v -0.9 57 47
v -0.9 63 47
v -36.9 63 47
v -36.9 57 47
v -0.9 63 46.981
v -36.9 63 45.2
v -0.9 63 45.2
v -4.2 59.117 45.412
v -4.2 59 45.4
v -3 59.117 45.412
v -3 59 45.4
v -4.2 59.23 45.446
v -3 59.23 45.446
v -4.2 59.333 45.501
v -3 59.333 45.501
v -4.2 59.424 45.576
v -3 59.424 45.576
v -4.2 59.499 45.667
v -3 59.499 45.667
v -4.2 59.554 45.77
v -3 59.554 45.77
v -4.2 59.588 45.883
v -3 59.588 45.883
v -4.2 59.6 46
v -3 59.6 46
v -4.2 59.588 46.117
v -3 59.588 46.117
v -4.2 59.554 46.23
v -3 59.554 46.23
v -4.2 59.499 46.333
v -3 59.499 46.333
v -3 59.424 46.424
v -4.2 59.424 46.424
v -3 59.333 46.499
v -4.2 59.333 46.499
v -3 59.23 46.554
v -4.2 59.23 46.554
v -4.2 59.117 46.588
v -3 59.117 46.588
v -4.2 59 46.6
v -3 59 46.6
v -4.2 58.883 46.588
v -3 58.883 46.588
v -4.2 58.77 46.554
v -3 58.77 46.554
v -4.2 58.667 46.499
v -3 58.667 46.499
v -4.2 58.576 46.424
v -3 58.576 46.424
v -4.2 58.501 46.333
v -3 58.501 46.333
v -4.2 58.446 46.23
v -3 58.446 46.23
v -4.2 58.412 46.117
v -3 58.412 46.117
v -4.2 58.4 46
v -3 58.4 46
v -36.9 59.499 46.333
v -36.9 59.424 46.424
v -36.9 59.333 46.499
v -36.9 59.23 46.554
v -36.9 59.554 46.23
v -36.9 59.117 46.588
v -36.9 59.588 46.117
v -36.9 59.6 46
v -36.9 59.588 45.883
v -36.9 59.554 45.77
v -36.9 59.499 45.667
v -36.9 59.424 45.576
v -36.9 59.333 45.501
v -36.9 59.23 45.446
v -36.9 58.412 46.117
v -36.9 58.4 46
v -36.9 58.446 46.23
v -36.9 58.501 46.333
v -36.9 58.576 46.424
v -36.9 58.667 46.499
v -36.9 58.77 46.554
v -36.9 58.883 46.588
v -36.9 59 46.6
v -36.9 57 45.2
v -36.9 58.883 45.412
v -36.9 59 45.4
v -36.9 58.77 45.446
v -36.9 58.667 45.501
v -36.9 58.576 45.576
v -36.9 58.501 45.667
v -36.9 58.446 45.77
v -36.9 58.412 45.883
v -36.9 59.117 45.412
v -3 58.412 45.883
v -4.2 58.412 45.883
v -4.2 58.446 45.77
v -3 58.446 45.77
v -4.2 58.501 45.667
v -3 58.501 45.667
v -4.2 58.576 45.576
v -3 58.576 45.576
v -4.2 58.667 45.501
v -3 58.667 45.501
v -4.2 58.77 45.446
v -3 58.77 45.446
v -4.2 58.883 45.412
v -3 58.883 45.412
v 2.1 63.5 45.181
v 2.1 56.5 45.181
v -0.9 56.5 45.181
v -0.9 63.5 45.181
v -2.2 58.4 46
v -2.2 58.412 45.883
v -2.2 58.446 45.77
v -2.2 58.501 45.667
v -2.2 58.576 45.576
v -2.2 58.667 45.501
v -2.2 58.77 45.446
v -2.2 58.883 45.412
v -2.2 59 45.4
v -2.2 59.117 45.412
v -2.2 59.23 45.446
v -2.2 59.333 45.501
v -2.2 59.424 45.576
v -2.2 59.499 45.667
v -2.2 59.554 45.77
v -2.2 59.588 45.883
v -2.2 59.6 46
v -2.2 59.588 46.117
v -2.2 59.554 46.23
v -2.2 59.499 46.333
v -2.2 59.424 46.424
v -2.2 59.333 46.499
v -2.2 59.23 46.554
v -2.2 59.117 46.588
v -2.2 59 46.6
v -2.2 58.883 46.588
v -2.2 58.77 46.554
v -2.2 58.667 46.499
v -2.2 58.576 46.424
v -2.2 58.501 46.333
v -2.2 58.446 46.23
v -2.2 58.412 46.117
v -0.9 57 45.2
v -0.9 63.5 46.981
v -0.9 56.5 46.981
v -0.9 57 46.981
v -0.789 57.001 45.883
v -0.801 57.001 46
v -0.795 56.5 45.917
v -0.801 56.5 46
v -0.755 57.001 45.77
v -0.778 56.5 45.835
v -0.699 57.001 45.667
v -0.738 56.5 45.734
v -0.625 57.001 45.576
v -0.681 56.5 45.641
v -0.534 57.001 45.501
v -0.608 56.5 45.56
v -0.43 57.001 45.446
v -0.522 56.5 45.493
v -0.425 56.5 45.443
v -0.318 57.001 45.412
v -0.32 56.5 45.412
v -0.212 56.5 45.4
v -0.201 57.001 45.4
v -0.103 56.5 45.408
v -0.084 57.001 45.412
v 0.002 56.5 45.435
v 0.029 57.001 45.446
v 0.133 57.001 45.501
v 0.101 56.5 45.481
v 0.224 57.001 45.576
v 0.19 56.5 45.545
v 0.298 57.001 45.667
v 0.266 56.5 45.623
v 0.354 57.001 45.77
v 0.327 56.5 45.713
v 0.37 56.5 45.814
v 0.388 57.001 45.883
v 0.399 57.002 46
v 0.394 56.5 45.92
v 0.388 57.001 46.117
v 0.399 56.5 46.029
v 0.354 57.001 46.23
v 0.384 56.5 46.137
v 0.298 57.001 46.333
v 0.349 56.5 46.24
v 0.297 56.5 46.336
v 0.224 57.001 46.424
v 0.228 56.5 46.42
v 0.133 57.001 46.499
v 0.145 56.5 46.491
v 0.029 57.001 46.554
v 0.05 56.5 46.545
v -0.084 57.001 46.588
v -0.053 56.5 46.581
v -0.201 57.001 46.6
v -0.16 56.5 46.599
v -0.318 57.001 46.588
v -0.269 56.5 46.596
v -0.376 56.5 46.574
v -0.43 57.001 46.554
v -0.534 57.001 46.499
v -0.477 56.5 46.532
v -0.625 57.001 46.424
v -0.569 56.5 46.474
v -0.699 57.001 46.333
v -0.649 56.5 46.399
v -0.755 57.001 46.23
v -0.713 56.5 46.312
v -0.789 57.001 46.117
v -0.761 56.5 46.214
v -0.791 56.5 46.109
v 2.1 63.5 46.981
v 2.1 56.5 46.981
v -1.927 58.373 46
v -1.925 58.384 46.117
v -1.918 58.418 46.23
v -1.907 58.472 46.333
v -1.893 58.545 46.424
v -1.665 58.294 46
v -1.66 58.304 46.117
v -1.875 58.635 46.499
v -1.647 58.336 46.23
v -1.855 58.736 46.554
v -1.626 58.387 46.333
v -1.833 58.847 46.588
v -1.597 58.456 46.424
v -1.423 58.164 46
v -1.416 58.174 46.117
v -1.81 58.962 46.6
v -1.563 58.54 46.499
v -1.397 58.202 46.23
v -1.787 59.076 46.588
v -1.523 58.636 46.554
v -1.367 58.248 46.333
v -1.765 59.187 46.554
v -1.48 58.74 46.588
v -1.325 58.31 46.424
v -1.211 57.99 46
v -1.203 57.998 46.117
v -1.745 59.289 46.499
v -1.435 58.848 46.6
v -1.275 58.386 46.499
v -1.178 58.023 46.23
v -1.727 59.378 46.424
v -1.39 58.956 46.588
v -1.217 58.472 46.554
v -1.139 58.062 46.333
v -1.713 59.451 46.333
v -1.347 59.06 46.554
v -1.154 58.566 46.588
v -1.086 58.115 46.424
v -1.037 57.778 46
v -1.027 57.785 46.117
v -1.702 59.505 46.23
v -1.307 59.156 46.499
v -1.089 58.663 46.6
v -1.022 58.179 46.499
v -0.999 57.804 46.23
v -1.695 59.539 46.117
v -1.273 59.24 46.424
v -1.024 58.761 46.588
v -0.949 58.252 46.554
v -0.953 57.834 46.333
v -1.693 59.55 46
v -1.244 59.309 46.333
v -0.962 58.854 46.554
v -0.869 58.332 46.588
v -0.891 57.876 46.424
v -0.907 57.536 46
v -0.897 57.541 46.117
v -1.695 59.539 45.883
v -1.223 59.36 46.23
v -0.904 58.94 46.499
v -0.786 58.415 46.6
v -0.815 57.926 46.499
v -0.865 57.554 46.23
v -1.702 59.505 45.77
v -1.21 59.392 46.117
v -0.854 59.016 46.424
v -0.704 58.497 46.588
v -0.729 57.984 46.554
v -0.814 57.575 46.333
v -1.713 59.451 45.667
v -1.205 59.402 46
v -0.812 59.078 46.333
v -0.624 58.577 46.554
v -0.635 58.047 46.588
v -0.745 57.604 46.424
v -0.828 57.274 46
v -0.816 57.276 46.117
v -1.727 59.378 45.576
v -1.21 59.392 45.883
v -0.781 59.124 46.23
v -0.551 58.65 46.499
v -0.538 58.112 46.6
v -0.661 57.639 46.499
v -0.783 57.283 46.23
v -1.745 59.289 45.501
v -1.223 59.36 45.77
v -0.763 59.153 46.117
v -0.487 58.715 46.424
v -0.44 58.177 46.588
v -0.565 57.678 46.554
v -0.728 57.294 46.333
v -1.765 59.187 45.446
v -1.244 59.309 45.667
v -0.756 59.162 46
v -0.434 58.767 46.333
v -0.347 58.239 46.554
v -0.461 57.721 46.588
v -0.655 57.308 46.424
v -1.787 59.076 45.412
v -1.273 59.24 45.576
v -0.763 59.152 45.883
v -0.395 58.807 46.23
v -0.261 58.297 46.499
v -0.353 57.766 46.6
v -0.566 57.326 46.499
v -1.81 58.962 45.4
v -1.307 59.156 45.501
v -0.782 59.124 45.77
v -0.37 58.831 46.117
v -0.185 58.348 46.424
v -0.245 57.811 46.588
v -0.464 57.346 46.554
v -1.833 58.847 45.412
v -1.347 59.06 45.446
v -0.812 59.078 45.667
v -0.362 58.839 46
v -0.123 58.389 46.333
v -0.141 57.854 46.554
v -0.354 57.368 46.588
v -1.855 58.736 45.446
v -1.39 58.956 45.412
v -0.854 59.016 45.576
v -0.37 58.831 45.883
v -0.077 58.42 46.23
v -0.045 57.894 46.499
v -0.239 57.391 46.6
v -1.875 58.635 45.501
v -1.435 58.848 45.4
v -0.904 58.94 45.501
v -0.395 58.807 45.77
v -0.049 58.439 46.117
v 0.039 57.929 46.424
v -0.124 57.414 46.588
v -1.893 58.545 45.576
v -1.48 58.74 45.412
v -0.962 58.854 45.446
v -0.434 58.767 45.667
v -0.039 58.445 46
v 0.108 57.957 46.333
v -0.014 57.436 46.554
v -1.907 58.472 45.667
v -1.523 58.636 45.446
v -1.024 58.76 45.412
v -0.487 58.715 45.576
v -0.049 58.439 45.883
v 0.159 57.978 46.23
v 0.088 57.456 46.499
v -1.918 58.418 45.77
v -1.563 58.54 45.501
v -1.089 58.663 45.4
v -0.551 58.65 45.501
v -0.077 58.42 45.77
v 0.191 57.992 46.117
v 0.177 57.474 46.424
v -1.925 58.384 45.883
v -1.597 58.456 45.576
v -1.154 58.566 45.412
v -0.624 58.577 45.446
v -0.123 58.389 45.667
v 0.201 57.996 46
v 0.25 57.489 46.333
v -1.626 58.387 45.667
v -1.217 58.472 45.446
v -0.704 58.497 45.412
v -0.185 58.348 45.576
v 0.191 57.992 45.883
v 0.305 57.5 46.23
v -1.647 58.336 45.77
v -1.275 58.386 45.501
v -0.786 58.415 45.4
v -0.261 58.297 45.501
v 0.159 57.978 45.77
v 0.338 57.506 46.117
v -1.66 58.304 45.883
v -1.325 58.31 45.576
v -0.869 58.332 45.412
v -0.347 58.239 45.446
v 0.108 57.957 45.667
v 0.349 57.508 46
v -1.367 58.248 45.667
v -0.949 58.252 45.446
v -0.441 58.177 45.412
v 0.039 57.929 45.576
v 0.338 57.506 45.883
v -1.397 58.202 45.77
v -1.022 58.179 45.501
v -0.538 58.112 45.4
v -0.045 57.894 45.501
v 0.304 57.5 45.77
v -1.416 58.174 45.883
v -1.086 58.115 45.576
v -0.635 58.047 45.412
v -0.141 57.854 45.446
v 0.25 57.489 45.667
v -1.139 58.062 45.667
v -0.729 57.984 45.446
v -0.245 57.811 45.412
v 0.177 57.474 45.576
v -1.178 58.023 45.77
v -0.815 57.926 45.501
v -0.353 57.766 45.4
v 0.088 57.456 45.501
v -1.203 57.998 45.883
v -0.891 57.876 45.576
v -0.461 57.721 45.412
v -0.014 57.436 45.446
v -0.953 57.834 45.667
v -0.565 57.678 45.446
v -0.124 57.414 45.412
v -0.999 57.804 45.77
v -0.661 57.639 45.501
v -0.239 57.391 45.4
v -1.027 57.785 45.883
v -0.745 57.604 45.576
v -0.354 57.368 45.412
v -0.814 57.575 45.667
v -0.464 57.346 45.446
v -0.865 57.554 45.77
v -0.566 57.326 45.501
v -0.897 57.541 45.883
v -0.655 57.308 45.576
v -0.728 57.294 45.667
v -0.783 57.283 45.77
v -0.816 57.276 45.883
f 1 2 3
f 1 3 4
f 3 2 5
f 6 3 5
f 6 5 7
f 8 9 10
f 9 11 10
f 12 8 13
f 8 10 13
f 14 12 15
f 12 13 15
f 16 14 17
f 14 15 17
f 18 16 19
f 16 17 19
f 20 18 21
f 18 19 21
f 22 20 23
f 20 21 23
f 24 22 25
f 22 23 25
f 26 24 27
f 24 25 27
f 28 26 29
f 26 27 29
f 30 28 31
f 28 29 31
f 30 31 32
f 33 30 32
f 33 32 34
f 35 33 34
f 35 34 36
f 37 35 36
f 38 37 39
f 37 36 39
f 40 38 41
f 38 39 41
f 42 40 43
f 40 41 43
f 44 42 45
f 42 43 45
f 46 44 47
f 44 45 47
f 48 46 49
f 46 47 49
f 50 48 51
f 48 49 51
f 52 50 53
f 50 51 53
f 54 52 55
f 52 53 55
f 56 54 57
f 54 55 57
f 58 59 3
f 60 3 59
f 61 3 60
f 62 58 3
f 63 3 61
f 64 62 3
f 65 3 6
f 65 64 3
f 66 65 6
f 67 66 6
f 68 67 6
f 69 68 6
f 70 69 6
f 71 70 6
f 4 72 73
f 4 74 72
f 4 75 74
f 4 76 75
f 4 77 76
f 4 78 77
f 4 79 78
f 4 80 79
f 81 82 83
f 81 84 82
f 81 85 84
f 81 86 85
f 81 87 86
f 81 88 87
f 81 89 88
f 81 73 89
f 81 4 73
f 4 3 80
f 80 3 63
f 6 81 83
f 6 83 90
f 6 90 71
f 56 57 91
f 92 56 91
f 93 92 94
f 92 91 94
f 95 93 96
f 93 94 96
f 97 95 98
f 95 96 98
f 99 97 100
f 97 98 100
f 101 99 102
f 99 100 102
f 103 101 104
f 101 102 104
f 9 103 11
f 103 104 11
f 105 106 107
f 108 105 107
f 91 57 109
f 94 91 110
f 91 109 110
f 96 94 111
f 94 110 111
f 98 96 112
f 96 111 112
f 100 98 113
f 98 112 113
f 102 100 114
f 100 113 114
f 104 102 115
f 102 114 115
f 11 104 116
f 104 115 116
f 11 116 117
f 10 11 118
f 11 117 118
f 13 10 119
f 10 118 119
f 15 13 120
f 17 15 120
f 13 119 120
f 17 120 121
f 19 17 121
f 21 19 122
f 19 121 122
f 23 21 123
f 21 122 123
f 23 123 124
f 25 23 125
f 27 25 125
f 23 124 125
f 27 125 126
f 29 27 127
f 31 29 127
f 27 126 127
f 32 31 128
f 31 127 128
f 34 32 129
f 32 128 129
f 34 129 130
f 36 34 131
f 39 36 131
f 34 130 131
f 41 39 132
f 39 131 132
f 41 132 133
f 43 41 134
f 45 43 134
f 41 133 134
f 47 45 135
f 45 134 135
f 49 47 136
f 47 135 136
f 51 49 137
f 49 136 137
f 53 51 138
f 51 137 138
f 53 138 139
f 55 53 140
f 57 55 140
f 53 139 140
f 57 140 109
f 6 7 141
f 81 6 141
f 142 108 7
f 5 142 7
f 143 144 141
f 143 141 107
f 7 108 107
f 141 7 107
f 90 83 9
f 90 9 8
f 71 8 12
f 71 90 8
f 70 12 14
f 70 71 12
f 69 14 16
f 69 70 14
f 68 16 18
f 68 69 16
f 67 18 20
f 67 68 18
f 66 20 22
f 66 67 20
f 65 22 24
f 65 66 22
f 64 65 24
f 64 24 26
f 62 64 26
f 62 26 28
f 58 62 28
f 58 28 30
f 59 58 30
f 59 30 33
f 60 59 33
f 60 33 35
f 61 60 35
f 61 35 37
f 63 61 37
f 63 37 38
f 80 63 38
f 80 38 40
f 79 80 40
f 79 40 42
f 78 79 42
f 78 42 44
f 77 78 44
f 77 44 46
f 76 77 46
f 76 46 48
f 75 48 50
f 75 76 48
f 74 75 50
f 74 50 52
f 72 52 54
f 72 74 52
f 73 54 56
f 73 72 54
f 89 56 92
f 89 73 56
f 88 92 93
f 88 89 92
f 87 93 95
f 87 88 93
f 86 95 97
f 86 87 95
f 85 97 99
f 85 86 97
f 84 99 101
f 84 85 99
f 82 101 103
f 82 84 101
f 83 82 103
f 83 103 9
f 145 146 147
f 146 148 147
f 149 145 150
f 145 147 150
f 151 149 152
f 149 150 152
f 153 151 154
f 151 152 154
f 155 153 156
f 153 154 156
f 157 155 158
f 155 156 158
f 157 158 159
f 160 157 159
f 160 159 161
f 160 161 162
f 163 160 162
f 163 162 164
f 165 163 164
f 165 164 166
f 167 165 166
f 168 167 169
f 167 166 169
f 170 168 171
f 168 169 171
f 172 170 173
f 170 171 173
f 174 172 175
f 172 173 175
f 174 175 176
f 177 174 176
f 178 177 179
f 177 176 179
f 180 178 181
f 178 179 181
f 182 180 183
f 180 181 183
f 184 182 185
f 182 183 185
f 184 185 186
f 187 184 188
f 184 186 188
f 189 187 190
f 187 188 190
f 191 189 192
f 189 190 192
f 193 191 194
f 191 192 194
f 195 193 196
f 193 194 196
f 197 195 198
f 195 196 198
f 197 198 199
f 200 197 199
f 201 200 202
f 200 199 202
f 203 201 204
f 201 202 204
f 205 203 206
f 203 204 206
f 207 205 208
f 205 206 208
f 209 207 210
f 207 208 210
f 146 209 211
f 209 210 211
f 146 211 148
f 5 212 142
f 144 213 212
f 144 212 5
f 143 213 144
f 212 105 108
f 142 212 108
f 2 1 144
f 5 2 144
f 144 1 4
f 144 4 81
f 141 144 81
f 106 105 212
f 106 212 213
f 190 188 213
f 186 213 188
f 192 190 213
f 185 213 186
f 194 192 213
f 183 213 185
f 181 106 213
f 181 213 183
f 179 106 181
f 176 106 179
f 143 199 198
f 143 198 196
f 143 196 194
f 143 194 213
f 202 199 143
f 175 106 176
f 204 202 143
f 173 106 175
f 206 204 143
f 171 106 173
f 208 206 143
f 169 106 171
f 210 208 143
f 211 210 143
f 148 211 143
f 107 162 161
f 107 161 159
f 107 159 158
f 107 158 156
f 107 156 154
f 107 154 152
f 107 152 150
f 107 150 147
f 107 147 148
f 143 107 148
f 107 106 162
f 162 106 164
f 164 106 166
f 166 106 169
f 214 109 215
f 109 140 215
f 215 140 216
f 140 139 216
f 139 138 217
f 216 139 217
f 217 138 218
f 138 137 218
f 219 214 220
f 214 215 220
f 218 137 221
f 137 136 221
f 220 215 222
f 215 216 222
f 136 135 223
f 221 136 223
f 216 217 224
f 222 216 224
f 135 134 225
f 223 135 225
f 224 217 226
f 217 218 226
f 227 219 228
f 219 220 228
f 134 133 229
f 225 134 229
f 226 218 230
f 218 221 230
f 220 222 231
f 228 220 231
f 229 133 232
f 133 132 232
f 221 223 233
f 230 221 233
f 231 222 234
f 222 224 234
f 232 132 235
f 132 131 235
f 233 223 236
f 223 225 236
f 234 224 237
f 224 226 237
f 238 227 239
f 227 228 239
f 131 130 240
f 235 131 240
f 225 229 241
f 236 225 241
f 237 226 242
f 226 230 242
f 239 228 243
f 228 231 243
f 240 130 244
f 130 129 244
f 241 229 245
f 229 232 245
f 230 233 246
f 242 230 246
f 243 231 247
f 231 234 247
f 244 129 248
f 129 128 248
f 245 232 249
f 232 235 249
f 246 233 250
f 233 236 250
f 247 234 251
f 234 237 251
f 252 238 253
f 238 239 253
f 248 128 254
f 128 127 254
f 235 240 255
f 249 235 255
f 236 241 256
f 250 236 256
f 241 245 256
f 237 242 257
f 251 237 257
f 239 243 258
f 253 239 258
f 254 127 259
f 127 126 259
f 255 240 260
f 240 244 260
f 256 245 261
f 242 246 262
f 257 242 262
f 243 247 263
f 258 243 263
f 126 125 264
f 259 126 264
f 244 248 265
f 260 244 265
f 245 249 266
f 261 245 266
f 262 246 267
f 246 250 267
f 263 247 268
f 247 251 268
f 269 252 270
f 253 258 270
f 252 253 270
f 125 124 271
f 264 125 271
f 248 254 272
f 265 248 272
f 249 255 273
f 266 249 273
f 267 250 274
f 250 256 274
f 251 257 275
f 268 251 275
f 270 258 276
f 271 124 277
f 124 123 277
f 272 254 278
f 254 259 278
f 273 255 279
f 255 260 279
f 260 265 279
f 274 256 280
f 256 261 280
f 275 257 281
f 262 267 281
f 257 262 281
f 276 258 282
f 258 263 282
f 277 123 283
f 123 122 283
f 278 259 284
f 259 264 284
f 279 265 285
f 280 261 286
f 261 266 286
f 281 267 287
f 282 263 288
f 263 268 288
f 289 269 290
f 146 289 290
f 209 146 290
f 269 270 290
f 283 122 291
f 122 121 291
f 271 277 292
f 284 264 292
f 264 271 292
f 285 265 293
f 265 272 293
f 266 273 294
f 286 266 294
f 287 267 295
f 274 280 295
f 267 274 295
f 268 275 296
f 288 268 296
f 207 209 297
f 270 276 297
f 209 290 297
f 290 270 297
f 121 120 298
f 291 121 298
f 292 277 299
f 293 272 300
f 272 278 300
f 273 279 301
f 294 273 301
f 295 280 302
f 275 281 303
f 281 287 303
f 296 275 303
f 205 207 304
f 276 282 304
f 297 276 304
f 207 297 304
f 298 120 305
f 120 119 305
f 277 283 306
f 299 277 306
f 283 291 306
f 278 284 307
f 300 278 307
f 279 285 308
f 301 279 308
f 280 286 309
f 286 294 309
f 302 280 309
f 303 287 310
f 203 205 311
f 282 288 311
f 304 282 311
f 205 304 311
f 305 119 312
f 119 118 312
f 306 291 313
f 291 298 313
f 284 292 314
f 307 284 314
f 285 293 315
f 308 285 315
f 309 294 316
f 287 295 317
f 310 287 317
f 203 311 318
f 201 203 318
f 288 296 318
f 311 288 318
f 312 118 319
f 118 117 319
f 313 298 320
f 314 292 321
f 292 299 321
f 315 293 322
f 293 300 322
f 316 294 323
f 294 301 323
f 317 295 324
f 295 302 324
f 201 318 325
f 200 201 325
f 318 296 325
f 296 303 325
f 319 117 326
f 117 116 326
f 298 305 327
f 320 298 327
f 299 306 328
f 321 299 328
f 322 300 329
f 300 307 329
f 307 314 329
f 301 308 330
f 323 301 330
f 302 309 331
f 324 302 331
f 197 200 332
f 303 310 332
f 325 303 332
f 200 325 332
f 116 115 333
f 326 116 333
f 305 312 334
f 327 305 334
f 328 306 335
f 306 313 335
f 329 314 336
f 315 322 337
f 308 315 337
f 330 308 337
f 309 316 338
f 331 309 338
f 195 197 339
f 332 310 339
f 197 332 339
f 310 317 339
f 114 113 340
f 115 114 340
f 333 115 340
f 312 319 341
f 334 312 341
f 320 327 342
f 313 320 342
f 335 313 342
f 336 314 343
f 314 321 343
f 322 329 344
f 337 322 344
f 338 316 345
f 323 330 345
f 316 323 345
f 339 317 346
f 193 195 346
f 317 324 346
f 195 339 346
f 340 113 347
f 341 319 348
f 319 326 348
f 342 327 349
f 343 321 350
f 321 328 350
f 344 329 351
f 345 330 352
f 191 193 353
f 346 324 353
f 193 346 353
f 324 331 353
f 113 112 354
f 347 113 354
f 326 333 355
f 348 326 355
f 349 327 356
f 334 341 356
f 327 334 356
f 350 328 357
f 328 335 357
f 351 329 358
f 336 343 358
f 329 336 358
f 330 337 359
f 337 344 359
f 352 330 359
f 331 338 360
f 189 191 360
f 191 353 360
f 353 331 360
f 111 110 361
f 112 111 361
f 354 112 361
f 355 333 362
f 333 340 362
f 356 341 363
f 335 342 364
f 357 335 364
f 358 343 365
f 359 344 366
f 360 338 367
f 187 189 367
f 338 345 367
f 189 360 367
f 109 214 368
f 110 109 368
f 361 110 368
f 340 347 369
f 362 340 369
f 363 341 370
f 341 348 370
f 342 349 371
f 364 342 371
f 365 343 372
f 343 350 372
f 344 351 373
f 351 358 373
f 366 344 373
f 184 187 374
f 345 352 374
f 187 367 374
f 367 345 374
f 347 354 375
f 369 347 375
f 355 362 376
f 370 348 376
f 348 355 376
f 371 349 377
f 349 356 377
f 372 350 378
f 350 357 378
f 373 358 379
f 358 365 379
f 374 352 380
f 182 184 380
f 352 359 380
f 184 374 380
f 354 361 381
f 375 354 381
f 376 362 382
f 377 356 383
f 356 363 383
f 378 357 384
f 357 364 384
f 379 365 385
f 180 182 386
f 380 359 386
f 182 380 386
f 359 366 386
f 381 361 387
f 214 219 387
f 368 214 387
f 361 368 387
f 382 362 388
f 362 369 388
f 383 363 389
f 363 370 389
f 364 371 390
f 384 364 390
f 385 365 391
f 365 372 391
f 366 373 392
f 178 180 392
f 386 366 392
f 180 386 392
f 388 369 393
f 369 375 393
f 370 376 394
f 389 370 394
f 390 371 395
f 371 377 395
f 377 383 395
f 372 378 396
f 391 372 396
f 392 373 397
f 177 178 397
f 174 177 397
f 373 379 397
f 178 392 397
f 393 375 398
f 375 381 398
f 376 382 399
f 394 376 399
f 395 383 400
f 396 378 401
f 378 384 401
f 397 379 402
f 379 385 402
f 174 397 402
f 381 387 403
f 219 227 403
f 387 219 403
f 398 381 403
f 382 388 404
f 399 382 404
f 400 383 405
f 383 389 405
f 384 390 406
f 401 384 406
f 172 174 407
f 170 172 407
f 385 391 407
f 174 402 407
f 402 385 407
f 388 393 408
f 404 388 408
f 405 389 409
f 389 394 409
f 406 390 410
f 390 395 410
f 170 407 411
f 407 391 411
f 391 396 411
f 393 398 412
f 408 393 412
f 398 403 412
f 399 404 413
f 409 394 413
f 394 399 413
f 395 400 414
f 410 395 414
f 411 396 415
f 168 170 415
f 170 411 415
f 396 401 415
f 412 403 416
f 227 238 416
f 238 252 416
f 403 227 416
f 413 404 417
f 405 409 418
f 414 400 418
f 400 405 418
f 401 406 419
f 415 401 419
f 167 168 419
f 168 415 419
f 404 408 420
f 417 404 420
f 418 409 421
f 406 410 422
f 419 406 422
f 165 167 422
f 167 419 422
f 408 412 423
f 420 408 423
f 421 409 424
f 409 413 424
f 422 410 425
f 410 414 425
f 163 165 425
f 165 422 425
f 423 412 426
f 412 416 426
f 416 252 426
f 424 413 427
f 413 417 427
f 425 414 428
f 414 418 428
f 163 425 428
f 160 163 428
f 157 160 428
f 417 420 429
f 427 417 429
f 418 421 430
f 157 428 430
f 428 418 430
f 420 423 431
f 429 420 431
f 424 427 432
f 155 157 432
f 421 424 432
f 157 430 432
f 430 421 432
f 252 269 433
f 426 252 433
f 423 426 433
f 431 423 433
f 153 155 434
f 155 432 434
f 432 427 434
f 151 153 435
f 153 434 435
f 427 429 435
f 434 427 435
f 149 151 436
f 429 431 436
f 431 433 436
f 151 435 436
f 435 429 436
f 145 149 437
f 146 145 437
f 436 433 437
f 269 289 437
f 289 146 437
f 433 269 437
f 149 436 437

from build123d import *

# Parameters (mm, degrees)
CYLINDER041_R                = 0.6
CYLINDER041_DEPTH            = 40
CYLINDER041_PITCH_ANGLE      = 90
SKETCH004_R                  = 0.6
SWEEP_PLACEMENT_ANGLE        = 180
BOX035_W                     = 3
BOX035_H                     = 7
BOX035_DEPTH                 = 1.8
BOX034_W                     = 1.8
BOX034_H                     = 6
BOX034_DEPTH                 = 36
BOX034_PITCH_ANGLE           = 90
FUSION002018_PLACEMENT_ANGLE = 180


with BuildPart() as cilindro041:
    # Cylinder041 → Cylinder041 (new body)
    with BuildSketch(Plane.XY):
        Circle(CYLINDER041_R)
    extrude(amount=CYLINDER041_DEPTH)


with BuildPart() as cilindro041_1:
    # Cylinder041 pitch: moved
    add(cilindro041.part.rotate(Axis((0, 0, 0), (0, 1, 0)), CYLINDER041_PITCH_ANGLE))


with BuildPart() as cilindro041_2:
    # Cylinder041 placement: moved
    add(cilindro041_1.part.moved(Location((-43, 59, 57))))


with BuildPart() as fusion002020:
    # Sweep: sweep along a path in Sketch002
    with BuildLine(Plane.XY) as sweep_path:
        Line((0, 0), (2.000007, 0))
        ThreePointArc((2.000007, 0), (3.413537, 0.585387), (3.999404, 1.998718))
        Line((3.999404, 1.998718), (3.999404, 3.99963))
    # Sketch004 → Sweep (sweep)
    with BuildSketch(Plane.YZ):
        Circle(SKETCH004_R)
    sweep(path=sweep_path.line, transition=Transition.RIGHT)


with BuildPart() as fusion002020_1:
    # Sweep placement: moved
    add(fusion002020.part.moved(Location((-4.2, 59, 57))).rotate(Axis((-4.2, 59, 57), (1, 0, 0)), SWEEP_PLACEMENT_ANGLE))

    # Fusion002020: union Cilindro041
    add(cilindro041_2.part)


with BuildPart() as cubo035:
    # Box035 → Box035 (new body)
    with BuildSketch(Plane(origin=(-3, -0.5, -1.81873), x_dir=(1, 0, 0), z_dir=(0, 0, 1))):
        with Locations((1.5, 3.5)):
            Rectangle(BOX035_W, BOX035_H)
    extrude(amount=BOX035_DEPTH)


with BuildPart() as cut061:
    # Box034 → Box034 (new body)
    with BuildSketch(Plane.XY):
        with Locations((0.9, 3)):
            Rectangle(BOX034_W, BOX034_H)
    extrude(amount=BOX034_DEPTH)


with BuildPart() as cut061_1:
    # Box034 pitch: moved
    add(cut061.part.rotate(Axis((0, 0, 0), (0, 1, 0)), BOX034_PITCH_ANGLE))


with BuildPart() as cut061_2:
    # Box034 placement: moved
    add(cut061_1.part)

    # Fusion002018: union Cubo035
    add(cubo035.part)


with BuildPart() as cut061_3:
    # Fusion002018 placement: moved
    add(cut061_2.part.moved(Location((-0.9, 63, 58))).rotate(Axis((-0.9, 63, 58), (0, 0, 1)), FUSION002018_PLACEMENT_ANGLE))

    # Cut061: cut Fusion002020
    add(fusion002020_1.part, mode=Mode.SUBTRACT)


with BuildPart() as cut061_4:
    # Cut061 placement: moved
    add(cut061_3.part.moved(Location((0, 0, -11))))


solid = cut061_4.part
